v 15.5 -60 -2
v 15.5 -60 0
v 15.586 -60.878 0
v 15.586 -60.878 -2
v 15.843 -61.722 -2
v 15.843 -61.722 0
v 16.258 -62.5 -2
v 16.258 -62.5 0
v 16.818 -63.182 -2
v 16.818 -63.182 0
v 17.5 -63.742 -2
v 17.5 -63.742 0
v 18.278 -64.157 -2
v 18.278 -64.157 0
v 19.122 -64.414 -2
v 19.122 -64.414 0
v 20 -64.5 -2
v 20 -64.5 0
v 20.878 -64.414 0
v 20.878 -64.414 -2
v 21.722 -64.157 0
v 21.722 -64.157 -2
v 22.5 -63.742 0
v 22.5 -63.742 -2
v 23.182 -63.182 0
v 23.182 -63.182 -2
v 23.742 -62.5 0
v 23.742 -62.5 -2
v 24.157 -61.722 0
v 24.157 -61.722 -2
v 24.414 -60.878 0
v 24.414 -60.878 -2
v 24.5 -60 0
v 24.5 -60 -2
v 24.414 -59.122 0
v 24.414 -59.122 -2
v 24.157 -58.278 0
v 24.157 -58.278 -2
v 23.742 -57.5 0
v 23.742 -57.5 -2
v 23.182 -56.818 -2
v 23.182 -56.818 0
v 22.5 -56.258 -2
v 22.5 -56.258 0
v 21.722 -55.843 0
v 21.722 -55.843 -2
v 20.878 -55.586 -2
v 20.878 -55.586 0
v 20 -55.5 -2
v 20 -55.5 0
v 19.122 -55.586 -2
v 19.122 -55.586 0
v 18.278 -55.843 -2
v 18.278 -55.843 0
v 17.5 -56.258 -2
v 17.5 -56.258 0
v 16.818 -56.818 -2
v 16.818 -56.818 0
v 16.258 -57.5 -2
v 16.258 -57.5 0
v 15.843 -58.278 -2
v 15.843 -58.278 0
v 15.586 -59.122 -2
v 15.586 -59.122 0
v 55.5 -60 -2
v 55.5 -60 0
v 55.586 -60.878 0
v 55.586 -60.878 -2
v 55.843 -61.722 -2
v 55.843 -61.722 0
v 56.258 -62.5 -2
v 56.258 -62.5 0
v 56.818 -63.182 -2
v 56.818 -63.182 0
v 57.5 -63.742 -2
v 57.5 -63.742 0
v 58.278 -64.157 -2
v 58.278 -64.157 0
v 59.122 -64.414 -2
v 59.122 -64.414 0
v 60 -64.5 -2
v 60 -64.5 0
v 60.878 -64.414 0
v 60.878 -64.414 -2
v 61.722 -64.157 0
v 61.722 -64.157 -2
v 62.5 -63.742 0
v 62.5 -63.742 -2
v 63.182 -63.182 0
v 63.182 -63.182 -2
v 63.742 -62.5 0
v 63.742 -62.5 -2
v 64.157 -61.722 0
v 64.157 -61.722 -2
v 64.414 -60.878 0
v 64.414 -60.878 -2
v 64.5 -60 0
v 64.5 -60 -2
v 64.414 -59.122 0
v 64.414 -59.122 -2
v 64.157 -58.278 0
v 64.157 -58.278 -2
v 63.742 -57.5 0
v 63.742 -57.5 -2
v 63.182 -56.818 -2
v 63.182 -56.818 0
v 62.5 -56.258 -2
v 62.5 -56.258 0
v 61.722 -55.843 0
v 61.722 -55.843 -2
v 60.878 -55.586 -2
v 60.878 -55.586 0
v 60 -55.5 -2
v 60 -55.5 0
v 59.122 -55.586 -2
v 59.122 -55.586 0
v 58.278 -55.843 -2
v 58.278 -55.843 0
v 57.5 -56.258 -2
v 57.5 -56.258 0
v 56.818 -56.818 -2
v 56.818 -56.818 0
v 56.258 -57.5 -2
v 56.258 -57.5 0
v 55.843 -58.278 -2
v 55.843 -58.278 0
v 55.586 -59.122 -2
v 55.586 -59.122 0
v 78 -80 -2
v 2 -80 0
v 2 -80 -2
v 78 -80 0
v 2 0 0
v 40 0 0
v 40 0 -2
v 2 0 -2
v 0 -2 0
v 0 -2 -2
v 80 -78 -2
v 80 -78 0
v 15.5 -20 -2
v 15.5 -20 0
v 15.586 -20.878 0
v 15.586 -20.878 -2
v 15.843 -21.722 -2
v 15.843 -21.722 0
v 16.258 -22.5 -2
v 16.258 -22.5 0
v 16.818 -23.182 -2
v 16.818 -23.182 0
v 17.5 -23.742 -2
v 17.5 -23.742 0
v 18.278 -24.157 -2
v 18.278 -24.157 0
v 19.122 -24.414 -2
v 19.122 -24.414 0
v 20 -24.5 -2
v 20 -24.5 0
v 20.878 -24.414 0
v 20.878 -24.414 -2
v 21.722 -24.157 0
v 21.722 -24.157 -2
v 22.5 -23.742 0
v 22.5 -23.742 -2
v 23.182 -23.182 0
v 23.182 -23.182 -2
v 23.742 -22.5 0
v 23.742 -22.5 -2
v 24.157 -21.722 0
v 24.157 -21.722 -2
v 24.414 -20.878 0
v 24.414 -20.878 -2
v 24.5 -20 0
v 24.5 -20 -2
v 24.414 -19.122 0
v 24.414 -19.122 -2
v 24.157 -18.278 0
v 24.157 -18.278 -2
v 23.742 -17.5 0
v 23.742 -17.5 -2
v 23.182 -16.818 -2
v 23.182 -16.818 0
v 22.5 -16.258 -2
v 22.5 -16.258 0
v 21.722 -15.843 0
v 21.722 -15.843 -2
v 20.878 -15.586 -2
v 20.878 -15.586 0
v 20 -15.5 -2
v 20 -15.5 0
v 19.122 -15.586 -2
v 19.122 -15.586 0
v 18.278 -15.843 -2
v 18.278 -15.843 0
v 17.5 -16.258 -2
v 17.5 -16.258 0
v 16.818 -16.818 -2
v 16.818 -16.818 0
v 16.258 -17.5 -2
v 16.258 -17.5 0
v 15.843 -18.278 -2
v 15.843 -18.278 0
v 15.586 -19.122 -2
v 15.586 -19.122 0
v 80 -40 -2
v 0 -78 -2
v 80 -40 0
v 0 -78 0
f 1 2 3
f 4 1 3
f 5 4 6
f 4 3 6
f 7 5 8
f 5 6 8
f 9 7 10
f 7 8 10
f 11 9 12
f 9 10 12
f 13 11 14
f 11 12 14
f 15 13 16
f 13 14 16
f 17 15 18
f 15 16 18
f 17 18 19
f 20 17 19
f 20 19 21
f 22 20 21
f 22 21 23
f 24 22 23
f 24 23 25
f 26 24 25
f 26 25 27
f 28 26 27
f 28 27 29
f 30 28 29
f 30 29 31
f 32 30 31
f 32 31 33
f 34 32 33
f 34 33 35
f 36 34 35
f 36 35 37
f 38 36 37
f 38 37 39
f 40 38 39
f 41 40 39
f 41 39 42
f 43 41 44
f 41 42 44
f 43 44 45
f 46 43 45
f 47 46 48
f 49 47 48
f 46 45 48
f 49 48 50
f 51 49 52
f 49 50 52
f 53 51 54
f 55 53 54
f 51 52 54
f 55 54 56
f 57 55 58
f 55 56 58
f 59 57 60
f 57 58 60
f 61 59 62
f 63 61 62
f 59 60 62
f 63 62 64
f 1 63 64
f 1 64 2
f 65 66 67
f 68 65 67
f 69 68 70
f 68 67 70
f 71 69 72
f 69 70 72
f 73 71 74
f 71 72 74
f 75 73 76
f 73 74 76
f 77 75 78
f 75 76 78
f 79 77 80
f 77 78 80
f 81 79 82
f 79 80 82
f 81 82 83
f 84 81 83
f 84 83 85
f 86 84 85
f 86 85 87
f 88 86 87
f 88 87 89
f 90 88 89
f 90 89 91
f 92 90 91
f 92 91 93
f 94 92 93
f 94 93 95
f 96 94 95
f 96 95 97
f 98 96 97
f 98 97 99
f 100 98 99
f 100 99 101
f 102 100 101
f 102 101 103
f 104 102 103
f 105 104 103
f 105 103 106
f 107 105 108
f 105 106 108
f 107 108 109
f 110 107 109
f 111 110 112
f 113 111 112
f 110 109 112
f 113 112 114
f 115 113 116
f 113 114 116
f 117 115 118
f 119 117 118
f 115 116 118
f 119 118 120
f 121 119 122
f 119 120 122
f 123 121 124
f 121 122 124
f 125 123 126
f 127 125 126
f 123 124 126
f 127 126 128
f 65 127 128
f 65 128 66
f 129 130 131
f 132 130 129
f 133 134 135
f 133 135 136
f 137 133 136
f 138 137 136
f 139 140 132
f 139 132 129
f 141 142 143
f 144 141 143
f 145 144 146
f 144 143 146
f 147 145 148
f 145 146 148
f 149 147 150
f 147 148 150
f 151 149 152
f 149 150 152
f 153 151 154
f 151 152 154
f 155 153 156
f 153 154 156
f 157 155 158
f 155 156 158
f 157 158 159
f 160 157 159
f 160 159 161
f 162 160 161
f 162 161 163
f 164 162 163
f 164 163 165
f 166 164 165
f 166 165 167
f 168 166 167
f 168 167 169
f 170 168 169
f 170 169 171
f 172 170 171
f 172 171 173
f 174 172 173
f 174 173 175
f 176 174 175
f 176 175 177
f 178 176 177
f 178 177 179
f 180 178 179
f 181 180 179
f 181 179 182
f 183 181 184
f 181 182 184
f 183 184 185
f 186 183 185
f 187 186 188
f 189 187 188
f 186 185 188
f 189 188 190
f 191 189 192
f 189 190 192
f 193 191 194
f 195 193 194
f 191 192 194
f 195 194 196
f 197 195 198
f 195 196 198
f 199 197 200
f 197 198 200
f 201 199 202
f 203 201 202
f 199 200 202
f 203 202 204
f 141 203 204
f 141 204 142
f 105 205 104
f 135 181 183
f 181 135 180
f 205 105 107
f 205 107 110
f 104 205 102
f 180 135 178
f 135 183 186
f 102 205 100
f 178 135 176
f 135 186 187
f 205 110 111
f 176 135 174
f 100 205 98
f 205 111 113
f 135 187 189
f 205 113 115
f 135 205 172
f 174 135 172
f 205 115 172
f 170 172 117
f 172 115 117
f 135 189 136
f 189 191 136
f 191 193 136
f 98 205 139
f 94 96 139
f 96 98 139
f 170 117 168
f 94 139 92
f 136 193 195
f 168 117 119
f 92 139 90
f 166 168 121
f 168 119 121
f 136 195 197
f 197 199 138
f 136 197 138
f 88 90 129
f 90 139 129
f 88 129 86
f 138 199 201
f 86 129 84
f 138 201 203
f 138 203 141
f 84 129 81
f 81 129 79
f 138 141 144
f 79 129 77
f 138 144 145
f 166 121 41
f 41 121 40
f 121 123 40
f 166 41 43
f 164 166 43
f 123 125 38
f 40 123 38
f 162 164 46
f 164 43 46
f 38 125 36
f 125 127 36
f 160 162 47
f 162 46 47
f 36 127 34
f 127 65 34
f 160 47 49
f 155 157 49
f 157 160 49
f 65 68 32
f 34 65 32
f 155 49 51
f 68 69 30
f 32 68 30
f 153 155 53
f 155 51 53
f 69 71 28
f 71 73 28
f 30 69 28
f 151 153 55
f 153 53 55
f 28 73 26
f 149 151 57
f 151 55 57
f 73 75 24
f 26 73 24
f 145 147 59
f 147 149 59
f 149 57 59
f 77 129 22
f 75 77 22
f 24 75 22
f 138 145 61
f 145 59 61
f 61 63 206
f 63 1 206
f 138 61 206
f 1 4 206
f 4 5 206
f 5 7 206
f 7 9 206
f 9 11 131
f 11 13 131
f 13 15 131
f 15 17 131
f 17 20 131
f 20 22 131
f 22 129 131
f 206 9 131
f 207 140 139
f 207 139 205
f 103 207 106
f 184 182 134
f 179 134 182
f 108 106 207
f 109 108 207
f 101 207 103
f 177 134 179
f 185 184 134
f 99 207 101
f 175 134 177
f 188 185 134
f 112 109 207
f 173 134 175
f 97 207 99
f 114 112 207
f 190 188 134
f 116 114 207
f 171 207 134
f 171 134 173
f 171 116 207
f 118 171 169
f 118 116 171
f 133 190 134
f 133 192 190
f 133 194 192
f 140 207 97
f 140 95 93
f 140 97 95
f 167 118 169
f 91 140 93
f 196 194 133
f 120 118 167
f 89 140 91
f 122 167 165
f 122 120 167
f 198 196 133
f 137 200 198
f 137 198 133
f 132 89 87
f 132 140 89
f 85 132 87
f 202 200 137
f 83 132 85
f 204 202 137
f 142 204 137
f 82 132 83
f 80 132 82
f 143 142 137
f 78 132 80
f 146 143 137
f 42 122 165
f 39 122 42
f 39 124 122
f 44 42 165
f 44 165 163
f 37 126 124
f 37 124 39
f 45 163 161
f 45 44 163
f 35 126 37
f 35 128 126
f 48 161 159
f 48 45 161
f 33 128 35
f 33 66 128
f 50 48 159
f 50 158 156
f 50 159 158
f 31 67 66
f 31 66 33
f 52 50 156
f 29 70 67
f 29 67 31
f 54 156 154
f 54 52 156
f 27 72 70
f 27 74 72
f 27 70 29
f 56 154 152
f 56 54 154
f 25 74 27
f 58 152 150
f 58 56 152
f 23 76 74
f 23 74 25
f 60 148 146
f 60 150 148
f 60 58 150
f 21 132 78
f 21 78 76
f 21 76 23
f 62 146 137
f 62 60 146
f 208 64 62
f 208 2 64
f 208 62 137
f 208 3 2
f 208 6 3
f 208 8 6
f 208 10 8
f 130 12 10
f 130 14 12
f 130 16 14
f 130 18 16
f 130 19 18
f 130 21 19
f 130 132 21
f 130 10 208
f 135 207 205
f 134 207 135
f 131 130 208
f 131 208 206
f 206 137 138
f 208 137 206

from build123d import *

# Parameters (mm, degrees)
EXTRUDE_1_DEPTH   = 2
HOLE_WIZARD_M81_D = 9
CHAMFER_1_SIZE    = 2


with BuildPart() as part:
    # Эскиз1 → Бобышка-Вытянуть1 (new body)
    with BuildSketch(Plane(origin=(0, 0, 0), x_dir=(1, 0, 0), z_dir=(0, 0, -1))):
        Polygon((0, 0), (0, 80), (80, 80), (80, 40), (40, 0), align=None)
    extrude(amount=EXTRUDE_1_DEPTH)

    # Отверстие с зазором M81 (through all)
    with Locations(Plane(origin=(0, 0, -2), x_dir=(1, 0, 0), z_dir=(0, 0, -1))):
        with Locations((20, 60), (20, 20), (60, 60)):
            Hole(HOLE_WIZARD_M81_D / 2)

    # Фаска1
    chamfer_1_edges = [part.edges().sort_by_distance(p)[0] for p in [
        (0, 0, -1),
        (0, -80, -1),
        (80, -80, -1),
    ]]
    chamfer(chamfer_1_edges, length=CHAMFER_1_SIZE)


solid = part.part
